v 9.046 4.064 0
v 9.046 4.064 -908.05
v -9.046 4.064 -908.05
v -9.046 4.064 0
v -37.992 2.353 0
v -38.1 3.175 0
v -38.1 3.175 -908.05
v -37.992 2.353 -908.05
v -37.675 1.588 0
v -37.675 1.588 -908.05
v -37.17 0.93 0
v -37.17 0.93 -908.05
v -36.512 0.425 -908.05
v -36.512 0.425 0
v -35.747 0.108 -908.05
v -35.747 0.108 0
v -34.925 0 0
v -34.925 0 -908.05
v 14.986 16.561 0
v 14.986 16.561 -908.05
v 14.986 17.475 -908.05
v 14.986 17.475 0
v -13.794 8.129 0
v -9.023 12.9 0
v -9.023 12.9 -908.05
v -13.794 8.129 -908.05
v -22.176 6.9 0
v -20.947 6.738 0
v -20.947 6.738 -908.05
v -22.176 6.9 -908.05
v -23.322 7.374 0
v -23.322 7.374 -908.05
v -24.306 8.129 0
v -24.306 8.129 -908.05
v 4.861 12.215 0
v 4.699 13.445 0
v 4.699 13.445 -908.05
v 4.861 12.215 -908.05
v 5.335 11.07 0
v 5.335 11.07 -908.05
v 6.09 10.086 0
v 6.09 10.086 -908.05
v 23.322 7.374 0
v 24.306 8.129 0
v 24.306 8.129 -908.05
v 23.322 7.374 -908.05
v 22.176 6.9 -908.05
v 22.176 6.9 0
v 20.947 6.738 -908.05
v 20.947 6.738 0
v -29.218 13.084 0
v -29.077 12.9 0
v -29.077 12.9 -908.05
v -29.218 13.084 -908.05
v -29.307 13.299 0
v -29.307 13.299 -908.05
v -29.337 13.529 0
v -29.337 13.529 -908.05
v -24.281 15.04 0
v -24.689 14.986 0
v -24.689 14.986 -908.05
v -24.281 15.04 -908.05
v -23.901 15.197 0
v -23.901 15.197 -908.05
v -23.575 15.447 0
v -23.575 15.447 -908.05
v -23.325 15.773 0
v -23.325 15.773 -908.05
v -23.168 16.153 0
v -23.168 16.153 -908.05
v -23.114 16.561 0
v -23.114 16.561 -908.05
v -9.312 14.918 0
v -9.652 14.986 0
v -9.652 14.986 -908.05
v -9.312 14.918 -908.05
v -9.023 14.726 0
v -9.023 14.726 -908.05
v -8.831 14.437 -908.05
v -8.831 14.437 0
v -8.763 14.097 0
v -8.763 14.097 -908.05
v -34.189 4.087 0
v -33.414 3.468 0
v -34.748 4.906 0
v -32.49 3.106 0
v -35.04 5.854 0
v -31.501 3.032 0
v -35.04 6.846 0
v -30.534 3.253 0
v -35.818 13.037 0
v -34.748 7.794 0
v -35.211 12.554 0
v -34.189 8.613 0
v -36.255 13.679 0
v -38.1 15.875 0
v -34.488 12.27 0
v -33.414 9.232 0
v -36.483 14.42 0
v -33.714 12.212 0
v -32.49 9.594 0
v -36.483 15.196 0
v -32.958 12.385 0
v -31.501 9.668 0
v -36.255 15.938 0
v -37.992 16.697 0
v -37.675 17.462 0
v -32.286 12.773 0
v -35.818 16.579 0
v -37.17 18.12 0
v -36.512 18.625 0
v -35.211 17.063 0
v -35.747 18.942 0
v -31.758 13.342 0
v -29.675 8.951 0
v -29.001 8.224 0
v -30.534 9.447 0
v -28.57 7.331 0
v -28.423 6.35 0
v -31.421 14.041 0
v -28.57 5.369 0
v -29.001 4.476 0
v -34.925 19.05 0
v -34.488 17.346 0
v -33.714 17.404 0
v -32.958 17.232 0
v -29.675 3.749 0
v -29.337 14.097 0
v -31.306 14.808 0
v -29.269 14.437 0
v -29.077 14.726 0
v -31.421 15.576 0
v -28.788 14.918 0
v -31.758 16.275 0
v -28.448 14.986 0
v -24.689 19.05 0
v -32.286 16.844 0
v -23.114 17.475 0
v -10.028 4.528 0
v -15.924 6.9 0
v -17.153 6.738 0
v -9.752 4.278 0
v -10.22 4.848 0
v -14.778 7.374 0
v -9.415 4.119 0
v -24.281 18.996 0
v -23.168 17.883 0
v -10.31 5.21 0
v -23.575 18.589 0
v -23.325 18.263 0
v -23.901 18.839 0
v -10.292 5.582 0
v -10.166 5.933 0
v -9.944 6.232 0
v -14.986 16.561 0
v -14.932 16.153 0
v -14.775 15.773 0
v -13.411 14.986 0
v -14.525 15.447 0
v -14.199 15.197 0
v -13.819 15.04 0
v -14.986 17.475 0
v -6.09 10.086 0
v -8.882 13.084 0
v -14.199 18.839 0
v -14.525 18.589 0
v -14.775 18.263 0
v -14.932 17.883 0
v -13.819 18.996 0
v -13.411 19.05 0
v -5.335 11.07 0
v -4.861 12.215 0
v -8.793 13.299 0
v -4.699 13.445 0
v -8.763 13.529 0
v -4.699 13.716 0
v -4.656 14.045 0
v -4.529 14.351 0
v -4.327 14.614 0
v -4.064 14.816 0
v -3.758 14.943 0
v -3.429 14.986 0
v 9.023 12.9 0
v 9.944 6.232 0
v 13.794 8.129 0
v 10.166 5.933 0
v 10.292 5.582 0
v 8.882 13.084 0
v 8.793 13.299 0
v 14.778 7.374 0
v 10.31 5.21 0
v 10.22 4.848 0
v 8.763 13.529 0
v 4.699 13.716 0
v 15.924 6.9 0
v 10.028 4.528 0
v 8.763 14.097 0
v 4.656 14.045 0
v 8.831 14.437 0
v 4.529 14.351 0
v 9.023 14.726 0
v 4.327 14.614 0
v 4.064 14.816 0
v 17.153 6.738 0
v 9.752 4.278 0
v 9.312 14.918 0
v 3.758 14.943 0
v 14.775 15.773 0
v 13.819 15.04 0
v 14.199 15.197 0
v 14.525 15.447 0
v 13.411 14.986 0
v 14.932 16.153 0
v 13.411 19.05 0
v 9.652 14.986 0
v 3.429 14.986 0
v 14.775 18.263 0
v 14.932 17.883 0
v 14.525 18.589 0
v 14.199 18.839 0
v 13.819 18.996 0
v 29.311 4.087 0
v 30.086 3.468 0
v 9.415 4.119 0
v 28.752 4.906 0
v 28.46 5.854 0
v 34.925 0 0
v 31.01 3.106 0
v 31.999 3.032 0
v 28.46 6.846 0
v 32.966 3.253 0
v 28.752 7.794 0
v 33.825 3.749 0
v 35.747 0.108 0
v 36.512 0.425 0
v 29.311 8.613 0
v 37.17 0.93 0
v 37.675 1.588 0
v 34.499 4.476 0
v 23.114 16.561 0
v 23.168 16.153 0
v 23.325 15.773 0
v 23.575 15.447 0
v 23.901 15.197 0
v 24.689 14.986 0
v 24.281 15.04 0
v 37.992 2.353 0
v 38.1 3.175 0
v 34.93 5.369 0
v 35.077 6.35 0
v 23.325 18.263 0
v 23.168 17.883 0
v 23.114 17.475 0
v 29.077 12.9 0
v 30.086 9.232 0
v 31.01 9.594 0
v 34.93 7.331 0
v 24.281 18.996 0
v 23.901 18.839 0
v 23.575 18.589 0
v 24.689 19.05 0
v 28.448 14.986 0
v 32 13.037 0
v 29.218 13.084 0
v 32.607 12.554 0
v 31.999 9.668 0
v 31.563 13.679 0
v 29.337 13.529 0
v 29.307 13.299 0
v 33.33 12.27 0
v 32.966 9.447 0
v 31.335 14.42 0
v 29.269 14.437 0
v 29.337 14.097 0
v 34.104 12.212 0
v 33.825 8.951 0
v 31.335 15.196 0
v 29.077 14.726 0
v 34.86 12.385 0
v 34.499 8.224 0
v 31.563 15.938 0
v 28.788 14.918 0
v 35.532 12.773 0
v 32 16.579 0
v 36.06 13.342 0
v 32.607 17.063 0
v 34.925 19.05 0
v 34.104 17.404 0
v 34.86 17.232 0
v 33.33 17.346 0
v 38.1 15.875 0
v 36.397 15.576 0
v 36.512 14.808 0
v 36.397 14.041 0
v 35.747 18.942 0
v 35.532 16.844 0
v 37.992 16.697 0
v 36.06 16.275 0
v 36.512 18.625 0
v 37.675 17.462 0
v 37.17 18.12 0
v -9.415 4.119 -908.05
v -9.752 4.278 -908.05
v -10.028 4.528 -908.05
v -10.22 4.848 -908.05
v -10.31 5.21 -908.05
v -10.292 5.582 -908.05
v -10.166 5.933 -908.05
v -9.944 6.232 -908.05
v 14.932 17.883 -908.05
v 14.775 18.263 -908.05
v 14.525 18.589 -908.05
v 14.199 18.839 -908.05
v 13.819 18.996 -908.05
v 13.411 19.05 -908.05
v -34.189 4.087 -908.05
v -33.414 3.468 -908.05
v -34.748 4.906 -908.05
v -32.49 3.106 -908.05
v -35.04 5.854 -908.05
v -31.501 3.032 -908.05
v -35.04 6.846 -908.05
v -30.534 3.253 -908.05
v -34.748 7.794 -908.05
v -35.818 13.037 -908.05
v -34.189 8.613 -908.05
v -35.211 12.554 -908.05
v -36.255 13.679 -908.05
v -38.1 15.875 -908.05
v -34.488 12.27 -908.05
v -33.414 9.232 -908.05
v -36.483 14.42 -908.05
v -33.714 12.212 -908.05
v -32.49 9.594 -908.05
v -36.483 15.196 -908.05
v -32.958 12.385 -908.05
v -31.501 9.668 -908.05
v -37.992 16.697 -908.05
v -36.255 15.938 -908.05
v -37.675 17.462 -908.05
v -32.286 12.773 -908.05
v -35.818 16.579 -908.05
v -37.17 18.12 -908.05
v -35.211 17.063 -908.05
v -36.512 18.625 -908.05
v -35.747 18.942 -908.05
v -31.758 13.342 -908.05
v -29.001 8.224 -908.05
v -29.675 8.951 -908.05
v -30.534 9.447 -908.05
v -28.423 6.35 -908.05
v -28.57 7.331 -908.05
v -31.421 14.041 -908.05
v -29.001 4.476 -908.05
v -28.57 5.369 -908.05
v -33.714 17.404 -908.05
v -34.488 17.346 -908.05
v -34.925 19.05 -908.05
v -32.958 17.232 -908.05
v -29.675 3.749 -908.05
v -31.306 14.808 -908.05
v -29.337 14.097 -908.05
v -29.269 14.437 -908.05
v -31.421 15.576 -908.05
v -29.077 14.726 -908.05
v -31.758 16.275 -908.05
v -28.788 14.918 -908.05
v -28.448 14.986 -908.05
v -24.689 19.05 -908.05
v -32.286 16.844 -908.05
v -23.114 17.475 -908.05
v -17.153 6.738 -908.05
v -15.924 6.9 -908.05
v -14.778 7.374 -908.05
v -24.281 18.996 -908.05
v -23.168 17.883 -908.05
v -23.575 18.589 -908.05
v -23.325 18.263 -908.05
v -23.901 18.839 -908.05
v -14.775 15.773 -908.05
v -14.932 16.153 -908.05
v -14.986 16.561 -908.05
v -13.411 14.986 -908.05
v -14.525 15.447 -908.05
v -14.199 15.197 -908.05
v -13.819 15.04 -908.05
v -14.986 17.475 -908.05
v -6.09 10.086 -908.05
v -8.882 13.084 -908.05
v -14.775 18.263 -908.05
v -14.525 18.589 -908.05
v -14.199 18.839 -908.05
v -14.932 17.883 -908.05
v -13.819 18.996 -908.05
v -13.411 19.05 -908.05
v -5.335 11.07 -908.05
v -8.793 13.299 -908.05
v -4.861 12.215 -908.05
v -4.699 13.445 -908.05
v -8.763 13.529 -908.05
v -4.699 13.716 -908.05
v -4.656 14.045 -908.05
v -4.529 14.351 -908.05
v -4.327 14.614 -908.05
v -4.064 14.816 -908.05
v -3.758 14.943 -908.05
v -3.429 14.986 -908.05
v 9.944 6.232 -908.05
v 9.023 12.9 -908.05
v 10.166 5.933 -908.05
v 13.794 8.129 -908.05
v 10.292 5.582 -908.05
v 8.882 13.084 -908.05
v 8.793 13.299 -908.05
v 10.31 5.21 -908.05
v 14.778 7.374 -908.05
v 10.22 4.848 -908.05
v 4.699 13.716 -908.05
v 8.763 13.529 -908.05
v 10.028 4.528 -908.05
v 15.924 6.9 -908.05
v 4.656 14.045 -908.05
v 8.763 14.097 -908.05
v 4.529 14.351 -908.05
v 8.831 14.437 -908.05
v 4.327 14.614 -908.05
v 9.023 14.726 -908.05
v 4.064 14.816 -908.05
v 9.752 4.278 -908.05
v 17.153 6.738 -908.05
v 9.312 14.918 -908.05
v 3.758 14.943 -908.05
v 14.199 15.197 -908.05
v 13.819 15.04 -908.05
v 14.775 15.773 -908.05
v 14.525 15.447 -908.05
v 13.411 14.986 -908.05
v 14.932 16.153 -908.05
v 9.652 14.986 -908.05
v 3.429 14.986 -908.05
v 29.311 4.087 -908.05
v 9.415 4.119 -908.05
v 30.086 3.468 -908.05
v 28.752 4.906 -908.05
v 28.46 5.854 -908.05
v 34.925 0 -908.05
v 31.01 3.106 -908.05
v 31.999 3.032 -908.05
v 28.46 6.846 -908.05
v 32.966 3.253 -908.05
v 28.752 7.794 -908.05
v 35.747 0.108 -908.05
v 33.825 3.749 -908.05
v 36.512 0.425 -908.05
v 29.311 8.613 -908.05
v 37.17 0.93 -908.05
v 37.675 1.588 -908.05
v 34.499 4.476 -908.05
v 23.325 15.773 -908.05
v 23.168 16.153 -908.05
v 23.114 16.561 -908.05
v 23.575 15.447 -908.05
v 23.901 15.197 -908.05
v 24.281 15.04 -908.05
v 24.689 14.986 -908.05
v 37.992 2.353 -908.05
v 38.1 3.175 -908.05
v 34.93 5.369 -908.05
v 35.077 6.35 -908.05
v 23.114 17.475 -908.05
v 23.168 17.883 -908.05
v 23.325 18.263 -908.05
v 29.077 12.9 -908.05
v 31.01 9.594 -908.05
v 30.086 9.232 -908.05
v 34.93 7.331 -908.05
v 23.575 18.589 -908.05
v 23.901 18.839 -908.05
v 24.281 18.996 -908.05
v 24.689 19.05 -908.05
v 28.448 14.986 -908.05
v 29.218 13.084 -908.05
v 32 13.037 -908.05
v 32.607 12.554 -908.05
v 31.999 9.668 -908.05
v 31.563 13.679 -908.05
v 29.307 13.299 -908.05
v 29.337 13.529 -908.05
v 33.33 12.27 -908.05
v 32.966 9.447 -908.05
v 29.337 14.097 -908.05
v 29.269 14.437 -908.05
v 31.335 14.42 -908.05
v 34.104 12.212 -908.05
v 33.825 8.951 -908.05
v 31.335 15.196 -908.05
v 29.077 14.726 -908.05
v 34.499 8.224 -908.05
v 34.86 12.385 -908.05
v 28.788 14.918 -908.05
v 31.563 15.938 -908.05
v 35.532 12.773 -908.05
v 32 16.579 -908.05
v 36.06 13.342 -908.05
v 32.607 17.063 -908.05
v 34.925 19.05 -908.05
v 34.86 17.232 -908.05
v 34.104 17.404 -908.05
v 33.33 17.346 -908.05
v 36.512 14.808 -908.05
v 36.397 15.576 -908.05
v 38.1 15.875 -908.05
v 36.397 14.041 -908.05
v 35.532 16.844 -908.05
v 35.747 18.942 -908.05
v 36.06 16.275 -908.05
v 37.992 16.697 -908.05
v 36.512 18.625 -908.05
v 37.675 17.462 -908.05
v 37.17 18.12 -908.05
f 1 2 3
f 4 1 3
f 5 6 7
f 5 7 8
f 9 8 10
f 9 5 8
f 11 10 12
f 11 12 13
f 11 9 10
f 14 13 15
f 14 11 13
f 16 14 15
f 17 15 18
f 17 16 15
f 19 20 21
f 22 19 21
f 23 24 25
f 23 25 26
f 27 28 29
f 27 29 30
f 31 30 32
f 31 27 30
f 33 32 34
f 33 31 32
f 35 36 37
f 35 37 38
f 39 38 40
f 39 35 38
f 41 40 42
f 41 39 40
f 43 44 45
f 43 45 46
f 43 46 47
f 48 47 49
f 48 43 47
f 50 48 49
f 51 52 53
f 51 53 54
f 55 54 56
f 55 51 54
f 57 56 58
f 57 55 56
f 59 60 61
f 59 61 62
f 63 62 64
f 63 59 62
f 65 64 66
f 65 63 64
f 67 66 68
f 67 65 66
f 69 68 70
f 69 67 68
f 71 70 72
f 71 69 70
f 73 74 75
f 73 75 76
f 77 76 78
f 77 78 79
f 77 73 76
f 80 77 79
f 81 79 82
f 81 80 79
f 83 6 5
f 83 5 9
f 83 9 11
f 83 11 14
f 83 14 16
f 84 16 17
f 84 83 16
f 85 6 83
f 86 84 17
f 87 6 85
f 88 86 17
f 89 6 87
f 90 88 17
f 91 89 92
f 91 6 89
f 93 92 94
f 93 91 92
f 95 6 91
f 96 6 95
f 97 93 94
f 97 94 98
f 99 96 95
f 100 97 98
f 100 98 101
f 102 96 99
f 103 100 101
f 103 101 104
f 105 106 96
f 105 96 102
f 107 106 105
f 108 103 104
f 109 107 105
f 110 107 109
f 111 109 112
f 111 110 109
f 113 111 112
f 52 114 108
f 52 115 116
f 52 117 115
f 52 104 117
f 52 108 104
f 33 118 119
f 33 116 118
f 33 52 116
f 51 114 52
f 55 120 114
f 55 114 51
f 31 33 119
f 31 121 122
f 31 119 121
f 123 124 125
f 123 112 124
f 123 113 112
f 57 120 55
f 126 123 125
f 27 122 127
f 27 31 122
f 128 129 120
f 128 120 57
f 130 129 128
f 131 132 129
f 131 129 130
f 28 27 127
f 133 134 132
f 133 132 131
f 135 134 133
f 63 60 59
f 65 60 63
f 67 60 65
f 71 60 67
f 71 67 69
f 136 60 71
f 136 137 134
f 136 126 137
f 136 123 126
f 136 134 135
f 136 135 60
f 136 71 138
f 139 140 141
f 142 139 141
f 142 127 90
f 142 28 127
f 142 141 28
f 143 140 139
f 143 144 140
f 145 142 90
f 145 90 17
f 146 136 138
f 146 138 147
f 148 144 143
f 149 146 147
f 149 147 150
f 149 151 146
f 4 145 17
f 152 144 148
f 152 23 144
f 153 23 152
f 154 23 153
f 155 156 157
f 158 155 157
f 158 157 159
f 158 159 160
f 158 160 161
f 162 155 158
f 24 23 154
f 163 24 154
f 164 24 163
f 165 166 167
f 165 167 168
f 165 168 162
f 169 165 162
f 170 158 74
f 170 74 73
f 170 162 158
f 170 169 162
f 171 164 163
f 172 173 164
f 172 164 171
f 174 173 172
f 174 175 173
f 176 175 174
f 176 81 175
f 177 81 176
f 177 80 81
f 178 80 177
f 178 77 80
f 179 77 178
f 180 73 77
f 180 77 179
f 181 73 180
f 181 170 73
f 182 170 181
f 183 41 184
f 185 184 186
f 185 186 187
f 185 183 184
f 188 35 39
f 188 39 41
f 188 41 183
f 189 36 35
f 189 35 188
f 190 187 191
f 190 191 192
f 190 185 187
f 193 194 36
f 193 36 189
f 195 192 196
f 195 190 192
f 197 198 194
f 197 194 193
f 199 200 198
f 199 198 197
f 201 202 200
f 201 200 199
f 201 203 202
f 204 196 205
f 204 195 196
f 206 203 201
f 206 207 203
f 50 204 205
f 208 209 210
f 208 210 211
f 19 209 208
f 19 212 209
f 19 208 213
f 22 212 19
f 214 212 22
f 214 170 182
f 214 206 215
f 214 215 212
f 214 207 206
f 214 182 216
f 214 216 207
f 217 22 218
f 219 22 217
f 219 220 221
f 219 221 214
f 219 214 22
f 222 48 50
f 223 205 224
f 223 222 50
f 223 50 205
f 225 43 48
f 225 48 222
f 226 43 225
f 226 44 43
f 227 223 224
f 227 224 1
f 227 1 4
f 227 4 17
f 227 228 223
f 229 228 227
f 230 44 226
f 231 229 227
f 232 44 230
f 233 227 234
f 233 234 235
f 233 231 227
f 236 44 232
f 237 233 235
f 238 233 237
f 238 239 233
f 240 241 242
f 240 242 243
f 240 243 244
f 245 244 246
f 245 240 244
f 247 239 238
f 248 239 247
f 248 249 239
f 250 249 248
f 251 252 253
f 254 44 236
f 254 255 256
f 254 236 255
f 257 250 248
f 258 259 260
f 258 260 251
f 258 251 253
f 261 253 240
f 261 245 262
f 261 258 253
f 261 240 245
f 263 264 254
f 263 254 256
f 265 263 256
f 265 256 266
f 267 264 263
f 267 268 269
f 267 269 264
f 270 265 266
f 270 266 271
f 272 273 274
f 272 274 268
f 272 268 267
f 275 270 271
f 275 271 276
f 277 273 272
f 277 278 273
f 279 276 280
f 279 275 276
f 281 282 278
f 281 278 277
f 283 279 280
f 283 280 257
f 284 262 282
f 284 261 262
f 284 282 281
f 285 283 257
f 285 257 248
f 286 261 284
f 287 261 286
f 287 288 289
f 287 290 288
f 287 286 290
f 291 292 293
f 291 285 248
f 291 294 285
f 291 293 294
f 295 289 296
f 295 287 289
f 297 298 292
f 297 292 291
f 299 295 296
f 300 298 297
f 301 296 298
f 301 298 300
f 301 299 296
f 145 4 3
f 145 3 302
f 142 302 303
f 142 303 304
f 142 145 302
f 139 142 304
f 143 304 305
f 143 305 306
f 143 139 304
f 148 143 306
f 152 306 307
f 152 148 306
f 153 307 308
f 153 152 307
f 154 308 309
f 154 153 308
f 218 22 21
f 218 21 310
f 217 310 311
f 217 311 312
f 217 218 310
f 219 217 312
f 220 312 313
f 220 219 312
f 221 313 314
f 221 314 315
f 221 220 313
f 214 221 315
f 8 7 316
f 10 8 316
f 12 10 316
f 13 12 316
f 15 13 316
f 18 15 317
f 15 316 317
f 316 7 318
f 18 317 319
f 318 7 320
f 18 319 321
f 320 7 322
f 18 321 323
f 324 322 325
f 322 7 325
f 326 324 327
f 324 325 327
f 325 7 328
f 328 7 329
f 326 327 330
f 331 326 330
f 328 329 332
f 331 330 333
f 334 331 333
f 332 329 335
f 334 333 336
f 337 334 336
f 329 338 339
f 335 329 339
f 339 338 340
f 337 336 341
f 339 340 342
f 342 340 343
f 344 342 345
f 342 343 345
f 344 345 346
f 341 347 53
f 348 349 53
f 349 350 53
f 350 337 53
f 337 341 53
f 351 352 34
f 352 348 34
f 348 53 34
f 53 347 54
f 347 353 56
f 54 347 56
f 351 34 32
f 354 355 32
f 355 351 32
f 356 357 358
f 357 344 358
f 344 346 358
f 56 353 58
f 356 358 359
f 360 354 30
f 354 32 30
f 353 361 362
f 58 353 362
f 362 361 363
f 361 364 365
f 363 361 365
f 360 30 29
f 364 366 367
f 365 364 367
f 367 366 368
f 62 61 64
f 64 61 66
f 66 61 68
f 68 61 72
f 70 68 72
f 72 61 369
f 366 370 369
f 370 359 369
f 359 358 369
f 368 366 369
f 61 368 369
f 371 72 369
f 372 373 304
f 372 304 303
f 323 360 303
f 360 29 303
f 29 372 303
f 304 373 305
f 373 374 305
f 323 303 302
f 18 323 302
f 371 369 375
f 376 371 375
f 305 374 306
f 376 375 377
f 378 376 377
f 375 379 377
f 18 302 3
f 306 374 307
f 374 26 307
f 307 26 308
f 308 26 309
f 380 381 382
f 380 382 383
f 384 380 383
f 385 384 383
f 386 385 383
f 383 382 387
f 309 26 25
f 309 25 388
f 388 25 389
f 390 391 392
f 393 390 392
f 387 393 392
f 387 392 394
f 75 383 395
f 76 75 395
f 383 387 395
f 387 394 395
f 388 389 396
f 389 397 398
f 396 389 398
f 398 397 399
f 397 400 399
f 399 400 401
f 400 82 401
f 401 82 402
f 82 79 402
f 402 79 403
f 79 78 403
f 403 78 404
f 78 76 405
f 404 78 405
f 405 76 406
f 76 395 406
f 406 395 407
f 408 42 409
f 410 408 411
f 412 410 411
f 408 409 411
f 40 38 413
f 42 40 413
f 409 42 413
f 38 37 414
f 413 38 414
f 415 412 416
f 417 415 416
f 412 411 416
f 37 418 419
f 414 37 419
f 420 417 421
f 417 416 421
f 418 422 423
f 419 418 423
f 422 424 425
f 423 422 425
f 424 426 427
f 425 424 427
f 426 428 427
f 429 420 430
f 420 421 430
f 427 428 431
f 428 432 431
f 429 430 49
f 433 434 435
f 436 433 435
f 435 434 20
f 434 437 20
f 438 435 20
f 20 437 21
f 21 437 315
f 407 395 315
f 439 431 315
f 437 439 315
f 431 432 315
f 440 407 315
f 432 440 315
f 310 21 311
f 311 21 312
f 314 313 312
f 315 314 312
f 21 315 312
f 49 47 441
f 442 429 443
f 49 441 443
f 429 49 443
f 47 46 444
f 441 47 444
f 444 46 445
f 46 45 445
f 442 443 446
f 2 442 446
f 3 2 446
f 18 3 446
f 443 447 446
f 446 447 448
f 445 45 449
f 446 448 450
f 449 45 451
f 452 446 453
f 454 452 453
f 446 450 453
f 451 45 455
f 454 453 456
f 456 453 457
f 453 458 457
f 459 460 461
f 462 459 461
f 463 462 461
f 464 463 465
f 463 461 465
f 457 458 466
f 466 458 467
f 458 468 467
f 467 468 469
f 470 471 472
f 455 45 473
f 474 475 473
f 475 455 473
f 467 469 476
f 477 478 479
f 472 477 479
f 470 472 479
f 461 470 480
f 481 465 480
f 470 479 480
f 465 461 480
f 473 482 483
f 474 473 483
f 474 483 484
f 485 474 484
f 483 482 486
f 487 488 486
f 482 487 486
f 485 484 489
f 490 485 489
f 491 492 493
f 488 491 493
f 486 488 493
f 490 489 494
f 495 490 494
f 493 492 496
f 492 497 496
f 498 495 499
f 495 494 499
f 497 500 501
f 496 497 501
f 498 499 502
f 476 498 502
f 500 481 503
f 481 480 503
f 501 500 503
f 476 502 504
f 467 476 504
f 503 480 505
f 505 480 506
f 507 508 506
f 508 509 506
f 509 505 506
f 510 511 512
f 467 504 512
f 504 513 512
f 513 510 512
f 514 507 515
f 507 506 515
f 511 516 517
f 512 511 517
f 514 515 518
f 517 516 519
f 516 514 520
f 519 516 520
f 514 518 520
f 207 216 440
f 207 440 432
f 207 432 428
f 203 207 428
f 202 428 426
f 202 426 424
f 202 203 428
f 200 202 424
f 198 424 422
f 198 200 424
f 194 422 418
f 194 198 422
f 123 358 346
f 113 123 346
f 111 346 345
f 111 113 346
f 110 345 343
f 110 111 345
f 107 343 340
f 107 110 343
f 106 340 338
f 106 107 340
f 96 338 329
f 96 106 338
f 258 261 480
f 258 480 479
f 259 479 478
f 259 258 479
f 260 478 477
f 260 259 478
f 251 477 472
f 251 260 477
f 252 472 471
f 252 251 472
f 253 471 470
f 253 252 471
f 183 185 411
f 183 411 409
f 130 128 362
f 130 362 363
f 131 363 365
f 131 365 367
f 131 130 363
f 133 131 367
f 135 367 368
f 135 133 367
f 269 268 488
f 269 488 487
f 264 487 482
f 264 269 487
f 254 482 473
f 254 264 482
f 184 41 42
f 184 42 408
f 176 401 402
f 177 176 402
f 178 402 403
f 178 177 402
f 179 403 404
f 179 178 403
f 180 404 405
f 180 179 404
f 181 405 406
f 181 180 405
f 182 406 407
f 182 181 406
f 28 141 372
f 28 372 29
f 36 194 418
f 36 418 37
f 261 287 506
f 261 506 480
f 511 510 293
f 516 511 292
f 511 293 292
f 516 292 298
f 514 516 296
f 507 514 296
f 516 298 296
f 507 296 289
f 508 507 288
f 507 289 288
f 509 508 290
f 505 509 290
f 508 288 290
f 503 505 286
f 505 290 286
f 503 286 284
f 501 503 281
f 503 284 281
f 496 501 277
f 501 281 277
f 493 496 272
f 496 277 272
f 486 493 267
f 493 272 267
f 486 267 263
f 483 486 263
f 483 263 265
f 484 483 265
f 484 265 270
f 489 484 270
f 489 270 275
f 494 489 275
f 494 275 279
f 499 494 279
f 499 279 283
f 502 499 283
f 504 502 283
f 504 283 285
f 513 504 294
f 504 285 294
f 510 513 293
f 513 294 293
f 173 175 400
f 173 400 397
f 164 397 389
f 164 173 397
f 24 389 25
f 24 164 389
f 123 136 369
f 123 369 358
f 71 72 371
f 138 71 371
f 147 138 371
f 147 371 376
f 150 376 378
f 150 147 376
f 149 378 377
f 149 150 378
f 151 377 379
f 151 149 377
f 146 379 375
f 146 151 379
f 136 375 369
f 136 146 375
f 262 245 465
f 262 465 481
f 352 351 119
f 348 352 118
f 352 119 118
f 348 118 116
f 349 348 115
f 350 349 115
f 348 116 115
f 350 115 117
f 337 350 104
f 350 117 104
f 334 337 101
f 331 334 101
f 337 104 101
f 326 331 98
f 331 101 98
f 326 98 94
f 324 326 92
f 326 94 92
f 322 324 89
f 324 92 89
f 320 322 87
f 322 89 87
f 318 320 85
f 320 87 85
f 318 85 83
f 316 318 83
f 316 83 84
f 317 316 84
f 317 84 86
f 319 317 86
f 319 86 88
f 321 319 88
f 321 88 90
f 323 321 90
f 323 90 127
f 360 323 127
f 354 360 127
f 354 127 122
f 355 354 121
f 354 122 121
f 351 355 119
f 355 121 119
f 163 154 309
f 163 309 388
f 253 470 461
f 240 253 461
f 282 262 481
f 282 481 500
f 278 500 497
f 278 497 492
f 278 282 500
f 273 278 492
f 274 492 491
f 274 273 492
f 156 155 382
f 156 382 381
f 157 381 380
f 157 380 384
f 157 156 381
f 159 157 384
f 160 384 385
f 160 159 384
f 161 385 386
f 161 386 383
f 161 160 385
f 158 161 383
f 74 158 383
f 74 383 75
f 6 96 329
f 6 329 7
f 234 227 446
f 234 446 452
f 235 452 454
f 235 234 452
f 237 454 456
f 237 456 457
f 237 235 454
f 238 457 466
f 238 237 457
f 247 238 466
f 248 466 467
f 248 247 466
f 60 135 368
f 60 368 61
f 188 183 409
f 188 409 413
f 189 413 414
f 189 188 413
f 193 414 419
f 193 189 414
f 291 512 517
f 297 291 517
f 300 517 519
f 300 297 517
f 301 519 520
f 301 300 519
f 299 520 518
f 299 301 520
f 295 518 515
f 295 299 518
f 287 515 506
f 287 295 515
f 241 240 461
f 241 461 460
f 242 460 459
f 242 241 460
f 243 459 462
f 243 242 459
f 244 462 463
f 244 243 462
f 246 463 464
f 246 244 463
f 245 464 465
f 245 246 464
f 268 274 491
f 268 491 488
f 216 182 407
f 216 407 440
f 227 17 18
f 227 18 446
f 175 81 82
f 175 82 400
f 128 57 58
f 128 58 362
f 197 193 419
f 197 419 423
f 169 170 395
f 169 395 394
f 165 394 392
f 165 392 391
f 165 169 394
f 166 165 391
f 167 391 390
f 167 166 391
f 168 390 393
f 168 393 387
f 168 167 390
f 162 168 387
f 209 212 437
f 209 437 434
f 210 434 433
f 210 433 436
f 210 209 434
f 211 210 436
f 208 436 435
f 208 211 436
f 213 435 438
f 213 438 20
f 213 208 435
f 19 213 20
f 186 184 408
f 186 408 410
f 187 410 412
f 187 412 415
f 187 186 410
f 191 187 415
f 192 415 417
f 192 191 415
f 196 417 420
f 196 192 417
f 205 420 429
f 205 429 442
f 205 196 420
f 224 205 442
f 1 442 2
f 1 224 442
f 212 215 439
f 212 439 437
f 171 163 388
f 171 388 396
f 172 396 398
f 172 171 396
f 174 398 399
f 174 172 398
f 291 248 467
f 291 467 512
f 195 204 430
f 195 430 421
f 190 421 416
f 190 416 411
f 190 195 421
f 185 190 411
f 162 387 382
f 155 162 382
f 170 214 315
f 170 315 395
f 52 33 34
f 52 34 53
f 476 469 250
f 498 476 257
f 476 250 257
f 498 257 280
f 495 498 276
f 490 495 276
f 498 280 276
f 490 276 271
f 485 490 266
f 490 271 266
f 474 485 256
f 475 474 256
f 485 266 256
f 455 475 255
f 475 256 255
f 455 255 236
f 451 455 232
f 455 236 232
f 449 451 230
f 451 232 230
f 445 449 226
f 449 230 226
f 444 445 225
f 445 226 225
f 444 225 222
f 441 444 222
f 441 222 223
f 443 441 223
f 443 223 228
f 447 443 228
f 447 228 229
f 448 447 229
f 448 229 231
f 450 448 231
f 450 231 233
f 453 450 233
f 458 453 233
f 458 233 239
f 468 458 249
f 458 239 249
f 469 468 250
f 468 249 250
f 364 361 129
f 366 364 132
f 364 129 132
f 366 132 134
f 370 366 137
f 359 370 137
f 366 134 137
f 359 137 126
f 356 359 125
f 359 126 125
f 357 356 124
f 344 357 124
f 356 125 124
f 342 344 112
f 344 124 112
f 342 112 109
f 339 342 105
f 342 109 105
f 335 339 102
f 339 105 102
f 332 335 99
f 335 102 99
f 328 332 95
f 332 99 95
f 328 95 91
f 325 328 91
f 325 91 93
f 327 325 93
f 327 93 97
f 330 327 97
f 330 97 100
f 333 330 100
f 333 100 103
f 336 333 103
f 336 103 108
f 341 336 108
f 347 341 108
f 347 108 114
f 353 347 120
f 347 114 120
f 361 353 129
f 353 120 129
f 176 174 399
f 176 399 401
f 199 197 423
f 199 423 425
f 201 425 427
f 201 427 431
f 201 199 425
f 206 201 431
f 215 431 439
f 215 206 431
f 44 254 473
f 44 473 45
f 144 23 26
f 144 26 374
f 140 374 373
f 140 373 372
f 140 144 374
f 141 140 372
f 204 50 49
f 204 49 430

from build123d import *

# Parameters (mm, degrees)
SKETCH1_R      = 2.6035
SKETCH1_R_2    = 3.3274
EXTRUDE1_DEPTH = 908.05


with BuildPart() as part:
    # Sketch1 → Extrude1 (new body)
    with BuildSketch(Plane.XY):
        with BuildLine():
            Line((23.114, 17.475199816), (23.114, 16.560799816))
            ThreePointArc((23.114, 16.560799816), (23.575248241, 15.447248057), (24.6888, 14.985999816))
            Line((24.6888, 14.985999816), (28.448, 14.985999816))
            ThreePointArc((28.448, 14.985999816), (29.076617928, 14.725617744), (29.337, 14.096999816))
            Line((29.337, 14.096999816), (29.337, 13.528917816))
            ThreePointArc((29.337, 13.528917816), (29.269328904, 13.188712244), (29.076617928, 12.900299887))
            Line((29.076617928, 12.900299887), (24.305516832, 8.129198791))
            ThreePointArc((24.305516832, 8.129198791), (22.76457081, 7.099571576), (20.946901043, 6.73801458))
            Line((20.946901043, 6.73801458), (17.153098957, 6.73801458))
            ThreePointArc((17.153098957, 6.73801458), (15.33542919, 7.099571576), (13.794483168, 8.129198791))
            Line((13.794483168, 8.129198791), (9.023382072, 12.900299887))
            ThreePointArc((9.023382072, 12.900299887), (8.830671096, 13.188712244), (8.763, 13.528917816))
            Line((8.763, 13.528917816), (8.763, 14.096999816))
            ThreePointArc((8.763, 14.096999816), (9.023382072, 14.725617744), (9.652, 14.985999816))
            Line((9.652, 14.985999816), (13.4112, 14.985999816))
            ThreePointArc((13.4112, 14.985999816), (14.524751759, 15.447248057), (14.986, 16.560799816))
            Line((14.986, 16.560799816), (14.986, 17.475199816))
            ThreePointArc((14.986, 17.475199816), (14.524751759, 18.588751575), (13.4112, 19.049999816))
            Line((13.4112, 19.049999816), (-13.4112, 19.049999816))
            ThreePointArc((-13.4112, 19.049999816), (-14.524751759, 18.588751575), (-14.986, 17.475199816))
            Line((-14.986, 17.475199816), (-14.986, 16.560799816))
            ThreePointArc((-14.986, 16.560799816), (-14.524751759, 15.447248057), (-13.4112, 14.985999816))
            Line((-13.4112, 14.985999816), (-9.652, 14.985999816))
            ThreePointArc((-9.652, 14.985999816), (-9.023382072, 14.725617744), (-8.763, 14.096999816))
            Line((-8.763, 14.096999816), (-8.763, 13.528917816))
            ThreePointArc((-8.763, 13.528917816), (-8.830671096, 13.188712244), (-9.023382072, 12.900299887))
            Line((-9.023382072, 12.900299887), (-13.794483168, 8.129198791))
            ThreePointArc((-13.794483168, 8.129198791), (-15.33542919, 7.099571576), (-17.153098957, 6.73801458))
            Line((-17.153098957, 6.73801458), (-20.946901043, 6.73801458))
            ThreePointArc((-20.946901043, 6.73801458), (-22.76457081, 7.099571576), (-24.305516832, 8.129198791))
            Line((-24.305516832, 8.129198791), (-29.076617928, 12.900299887))
            ThreePointArc((-29.076617928, 12.900299887), (-29.269328904, 13.188712244), (-29.337, 13.528917816))
            Line((-29.337, 13.528917816), (-29.337, 14.096999816))
            ThreePointArc((-29.337, 14.096999816), (-29.076617928, 14.725617744), (-28.448, 14.985999816))
            Line((-28.448, 14.985999816), (-24.6888, 14.985999816))
            ThreePointArc((-24.6888, 14.985999816), (-23.575248241, 15.447248057), (-23.114, 16.560799816))
            Line((-23.114, 16.560799816), (-23.114, 17.475199816))
            ThreePointArc((-23.114, 17.475199816), (-23.575248241, 18.588751575), (-24.6888, 19.049999816))
            Line((-24.6888, 19.049999816), (-34.925, 19.049999816))
            ThreePointArc((-34.925, 19.049999816), (-37.17006403, 18.120063846), (-38.1, 15.874999816))
            Line((-38.1, 15.874999816), (-38.1, 3.175))
            ThreePointArc((-38.1, 3.175), (-37.17006403, 0.92993597), (-34.925, 0))
            Line((-34.925, 0), (34.925, 0))
            ThreePointArc((34.925, 0), (37.17006403, 0.92993597), (38.1, 3.175))
            Line((38.1, 3.175), (38.1, 15.874999816))
            ThreePointArc((38.1, 15.874999816), (37.17006403, 18.120063846), (34.925, 19.049999816))
            Line((34.925, 19.049999816), (24.6888, 19.049999816))
            ThreePointArc((24.6888, 19.049999816), (23.575248241, 18.588751575), (23.114, 17.475199816))
        make_face()
        with Locations((-33.909, 14.8082)):
            Circle(SKETCH1_R, mode=Mode.SUBTRACT)
        with Locations((31.75, 6.35)):
            Circle(SKETCH1_R_2, mode=Mode.SUBTRACT)
        with Locations((33.909, 14.8082)):
            Circle(SKETCH1_R, mode=Mode.SUBTRACT)
        with Locations((-31.75, 6.35)):
            Circle(SKETCH1_R_2, mode=Mode.SUBTRACT)
        with BuildLine():
            Line((-9.944292429, 6.232025428), (-6.090184211, 10.086133646))
            ThreePointArc((-6.090184211, 10.086133646), (-5.060556996, 11.627079669), (-4.699, 13.444749436))
            Line((-4.699, 13.444749436), (-4.699, 13.715999816))
            ThreePointArc((-4.699, 13.715999816), (-4.327025612, 14.614025428), (-3.429, 14.985999816))
            Line((-3.429, 14.985999816), (3.429, 14.985999816))
            ThreePointArc((3.429, 14.985999816), (4.327025612, 14.614025428), (4.699, 13.715999816))
            Line((4.699, 13.715999816), (4.699, 13.444749436))
            ThreePointArc((4.699, 13.444749436), (5.060556996, 11.627079669), (6.090184211, 10.086133646))
            Line((6.090184211, 10.086133646), (9.944292429, 6.232025428))
            ThreePointArc((9.944292429, 6.232025428), (10.219593823, 4.847991857), (9.046266817, 4.063999816))
            Line((9.046266817, 4.063999816), (-9.046266817, 4.063999816))
            ThreePointArc((-9.046266817, 4.063999816), (-10.219593823, 4.847991857), (-9.944292429, 6.232025428))
        make_face(mode=Mode.SUBTRACT)
    extrude(amount=-EXTRUDE1_DEPTH)


solid = part.part
